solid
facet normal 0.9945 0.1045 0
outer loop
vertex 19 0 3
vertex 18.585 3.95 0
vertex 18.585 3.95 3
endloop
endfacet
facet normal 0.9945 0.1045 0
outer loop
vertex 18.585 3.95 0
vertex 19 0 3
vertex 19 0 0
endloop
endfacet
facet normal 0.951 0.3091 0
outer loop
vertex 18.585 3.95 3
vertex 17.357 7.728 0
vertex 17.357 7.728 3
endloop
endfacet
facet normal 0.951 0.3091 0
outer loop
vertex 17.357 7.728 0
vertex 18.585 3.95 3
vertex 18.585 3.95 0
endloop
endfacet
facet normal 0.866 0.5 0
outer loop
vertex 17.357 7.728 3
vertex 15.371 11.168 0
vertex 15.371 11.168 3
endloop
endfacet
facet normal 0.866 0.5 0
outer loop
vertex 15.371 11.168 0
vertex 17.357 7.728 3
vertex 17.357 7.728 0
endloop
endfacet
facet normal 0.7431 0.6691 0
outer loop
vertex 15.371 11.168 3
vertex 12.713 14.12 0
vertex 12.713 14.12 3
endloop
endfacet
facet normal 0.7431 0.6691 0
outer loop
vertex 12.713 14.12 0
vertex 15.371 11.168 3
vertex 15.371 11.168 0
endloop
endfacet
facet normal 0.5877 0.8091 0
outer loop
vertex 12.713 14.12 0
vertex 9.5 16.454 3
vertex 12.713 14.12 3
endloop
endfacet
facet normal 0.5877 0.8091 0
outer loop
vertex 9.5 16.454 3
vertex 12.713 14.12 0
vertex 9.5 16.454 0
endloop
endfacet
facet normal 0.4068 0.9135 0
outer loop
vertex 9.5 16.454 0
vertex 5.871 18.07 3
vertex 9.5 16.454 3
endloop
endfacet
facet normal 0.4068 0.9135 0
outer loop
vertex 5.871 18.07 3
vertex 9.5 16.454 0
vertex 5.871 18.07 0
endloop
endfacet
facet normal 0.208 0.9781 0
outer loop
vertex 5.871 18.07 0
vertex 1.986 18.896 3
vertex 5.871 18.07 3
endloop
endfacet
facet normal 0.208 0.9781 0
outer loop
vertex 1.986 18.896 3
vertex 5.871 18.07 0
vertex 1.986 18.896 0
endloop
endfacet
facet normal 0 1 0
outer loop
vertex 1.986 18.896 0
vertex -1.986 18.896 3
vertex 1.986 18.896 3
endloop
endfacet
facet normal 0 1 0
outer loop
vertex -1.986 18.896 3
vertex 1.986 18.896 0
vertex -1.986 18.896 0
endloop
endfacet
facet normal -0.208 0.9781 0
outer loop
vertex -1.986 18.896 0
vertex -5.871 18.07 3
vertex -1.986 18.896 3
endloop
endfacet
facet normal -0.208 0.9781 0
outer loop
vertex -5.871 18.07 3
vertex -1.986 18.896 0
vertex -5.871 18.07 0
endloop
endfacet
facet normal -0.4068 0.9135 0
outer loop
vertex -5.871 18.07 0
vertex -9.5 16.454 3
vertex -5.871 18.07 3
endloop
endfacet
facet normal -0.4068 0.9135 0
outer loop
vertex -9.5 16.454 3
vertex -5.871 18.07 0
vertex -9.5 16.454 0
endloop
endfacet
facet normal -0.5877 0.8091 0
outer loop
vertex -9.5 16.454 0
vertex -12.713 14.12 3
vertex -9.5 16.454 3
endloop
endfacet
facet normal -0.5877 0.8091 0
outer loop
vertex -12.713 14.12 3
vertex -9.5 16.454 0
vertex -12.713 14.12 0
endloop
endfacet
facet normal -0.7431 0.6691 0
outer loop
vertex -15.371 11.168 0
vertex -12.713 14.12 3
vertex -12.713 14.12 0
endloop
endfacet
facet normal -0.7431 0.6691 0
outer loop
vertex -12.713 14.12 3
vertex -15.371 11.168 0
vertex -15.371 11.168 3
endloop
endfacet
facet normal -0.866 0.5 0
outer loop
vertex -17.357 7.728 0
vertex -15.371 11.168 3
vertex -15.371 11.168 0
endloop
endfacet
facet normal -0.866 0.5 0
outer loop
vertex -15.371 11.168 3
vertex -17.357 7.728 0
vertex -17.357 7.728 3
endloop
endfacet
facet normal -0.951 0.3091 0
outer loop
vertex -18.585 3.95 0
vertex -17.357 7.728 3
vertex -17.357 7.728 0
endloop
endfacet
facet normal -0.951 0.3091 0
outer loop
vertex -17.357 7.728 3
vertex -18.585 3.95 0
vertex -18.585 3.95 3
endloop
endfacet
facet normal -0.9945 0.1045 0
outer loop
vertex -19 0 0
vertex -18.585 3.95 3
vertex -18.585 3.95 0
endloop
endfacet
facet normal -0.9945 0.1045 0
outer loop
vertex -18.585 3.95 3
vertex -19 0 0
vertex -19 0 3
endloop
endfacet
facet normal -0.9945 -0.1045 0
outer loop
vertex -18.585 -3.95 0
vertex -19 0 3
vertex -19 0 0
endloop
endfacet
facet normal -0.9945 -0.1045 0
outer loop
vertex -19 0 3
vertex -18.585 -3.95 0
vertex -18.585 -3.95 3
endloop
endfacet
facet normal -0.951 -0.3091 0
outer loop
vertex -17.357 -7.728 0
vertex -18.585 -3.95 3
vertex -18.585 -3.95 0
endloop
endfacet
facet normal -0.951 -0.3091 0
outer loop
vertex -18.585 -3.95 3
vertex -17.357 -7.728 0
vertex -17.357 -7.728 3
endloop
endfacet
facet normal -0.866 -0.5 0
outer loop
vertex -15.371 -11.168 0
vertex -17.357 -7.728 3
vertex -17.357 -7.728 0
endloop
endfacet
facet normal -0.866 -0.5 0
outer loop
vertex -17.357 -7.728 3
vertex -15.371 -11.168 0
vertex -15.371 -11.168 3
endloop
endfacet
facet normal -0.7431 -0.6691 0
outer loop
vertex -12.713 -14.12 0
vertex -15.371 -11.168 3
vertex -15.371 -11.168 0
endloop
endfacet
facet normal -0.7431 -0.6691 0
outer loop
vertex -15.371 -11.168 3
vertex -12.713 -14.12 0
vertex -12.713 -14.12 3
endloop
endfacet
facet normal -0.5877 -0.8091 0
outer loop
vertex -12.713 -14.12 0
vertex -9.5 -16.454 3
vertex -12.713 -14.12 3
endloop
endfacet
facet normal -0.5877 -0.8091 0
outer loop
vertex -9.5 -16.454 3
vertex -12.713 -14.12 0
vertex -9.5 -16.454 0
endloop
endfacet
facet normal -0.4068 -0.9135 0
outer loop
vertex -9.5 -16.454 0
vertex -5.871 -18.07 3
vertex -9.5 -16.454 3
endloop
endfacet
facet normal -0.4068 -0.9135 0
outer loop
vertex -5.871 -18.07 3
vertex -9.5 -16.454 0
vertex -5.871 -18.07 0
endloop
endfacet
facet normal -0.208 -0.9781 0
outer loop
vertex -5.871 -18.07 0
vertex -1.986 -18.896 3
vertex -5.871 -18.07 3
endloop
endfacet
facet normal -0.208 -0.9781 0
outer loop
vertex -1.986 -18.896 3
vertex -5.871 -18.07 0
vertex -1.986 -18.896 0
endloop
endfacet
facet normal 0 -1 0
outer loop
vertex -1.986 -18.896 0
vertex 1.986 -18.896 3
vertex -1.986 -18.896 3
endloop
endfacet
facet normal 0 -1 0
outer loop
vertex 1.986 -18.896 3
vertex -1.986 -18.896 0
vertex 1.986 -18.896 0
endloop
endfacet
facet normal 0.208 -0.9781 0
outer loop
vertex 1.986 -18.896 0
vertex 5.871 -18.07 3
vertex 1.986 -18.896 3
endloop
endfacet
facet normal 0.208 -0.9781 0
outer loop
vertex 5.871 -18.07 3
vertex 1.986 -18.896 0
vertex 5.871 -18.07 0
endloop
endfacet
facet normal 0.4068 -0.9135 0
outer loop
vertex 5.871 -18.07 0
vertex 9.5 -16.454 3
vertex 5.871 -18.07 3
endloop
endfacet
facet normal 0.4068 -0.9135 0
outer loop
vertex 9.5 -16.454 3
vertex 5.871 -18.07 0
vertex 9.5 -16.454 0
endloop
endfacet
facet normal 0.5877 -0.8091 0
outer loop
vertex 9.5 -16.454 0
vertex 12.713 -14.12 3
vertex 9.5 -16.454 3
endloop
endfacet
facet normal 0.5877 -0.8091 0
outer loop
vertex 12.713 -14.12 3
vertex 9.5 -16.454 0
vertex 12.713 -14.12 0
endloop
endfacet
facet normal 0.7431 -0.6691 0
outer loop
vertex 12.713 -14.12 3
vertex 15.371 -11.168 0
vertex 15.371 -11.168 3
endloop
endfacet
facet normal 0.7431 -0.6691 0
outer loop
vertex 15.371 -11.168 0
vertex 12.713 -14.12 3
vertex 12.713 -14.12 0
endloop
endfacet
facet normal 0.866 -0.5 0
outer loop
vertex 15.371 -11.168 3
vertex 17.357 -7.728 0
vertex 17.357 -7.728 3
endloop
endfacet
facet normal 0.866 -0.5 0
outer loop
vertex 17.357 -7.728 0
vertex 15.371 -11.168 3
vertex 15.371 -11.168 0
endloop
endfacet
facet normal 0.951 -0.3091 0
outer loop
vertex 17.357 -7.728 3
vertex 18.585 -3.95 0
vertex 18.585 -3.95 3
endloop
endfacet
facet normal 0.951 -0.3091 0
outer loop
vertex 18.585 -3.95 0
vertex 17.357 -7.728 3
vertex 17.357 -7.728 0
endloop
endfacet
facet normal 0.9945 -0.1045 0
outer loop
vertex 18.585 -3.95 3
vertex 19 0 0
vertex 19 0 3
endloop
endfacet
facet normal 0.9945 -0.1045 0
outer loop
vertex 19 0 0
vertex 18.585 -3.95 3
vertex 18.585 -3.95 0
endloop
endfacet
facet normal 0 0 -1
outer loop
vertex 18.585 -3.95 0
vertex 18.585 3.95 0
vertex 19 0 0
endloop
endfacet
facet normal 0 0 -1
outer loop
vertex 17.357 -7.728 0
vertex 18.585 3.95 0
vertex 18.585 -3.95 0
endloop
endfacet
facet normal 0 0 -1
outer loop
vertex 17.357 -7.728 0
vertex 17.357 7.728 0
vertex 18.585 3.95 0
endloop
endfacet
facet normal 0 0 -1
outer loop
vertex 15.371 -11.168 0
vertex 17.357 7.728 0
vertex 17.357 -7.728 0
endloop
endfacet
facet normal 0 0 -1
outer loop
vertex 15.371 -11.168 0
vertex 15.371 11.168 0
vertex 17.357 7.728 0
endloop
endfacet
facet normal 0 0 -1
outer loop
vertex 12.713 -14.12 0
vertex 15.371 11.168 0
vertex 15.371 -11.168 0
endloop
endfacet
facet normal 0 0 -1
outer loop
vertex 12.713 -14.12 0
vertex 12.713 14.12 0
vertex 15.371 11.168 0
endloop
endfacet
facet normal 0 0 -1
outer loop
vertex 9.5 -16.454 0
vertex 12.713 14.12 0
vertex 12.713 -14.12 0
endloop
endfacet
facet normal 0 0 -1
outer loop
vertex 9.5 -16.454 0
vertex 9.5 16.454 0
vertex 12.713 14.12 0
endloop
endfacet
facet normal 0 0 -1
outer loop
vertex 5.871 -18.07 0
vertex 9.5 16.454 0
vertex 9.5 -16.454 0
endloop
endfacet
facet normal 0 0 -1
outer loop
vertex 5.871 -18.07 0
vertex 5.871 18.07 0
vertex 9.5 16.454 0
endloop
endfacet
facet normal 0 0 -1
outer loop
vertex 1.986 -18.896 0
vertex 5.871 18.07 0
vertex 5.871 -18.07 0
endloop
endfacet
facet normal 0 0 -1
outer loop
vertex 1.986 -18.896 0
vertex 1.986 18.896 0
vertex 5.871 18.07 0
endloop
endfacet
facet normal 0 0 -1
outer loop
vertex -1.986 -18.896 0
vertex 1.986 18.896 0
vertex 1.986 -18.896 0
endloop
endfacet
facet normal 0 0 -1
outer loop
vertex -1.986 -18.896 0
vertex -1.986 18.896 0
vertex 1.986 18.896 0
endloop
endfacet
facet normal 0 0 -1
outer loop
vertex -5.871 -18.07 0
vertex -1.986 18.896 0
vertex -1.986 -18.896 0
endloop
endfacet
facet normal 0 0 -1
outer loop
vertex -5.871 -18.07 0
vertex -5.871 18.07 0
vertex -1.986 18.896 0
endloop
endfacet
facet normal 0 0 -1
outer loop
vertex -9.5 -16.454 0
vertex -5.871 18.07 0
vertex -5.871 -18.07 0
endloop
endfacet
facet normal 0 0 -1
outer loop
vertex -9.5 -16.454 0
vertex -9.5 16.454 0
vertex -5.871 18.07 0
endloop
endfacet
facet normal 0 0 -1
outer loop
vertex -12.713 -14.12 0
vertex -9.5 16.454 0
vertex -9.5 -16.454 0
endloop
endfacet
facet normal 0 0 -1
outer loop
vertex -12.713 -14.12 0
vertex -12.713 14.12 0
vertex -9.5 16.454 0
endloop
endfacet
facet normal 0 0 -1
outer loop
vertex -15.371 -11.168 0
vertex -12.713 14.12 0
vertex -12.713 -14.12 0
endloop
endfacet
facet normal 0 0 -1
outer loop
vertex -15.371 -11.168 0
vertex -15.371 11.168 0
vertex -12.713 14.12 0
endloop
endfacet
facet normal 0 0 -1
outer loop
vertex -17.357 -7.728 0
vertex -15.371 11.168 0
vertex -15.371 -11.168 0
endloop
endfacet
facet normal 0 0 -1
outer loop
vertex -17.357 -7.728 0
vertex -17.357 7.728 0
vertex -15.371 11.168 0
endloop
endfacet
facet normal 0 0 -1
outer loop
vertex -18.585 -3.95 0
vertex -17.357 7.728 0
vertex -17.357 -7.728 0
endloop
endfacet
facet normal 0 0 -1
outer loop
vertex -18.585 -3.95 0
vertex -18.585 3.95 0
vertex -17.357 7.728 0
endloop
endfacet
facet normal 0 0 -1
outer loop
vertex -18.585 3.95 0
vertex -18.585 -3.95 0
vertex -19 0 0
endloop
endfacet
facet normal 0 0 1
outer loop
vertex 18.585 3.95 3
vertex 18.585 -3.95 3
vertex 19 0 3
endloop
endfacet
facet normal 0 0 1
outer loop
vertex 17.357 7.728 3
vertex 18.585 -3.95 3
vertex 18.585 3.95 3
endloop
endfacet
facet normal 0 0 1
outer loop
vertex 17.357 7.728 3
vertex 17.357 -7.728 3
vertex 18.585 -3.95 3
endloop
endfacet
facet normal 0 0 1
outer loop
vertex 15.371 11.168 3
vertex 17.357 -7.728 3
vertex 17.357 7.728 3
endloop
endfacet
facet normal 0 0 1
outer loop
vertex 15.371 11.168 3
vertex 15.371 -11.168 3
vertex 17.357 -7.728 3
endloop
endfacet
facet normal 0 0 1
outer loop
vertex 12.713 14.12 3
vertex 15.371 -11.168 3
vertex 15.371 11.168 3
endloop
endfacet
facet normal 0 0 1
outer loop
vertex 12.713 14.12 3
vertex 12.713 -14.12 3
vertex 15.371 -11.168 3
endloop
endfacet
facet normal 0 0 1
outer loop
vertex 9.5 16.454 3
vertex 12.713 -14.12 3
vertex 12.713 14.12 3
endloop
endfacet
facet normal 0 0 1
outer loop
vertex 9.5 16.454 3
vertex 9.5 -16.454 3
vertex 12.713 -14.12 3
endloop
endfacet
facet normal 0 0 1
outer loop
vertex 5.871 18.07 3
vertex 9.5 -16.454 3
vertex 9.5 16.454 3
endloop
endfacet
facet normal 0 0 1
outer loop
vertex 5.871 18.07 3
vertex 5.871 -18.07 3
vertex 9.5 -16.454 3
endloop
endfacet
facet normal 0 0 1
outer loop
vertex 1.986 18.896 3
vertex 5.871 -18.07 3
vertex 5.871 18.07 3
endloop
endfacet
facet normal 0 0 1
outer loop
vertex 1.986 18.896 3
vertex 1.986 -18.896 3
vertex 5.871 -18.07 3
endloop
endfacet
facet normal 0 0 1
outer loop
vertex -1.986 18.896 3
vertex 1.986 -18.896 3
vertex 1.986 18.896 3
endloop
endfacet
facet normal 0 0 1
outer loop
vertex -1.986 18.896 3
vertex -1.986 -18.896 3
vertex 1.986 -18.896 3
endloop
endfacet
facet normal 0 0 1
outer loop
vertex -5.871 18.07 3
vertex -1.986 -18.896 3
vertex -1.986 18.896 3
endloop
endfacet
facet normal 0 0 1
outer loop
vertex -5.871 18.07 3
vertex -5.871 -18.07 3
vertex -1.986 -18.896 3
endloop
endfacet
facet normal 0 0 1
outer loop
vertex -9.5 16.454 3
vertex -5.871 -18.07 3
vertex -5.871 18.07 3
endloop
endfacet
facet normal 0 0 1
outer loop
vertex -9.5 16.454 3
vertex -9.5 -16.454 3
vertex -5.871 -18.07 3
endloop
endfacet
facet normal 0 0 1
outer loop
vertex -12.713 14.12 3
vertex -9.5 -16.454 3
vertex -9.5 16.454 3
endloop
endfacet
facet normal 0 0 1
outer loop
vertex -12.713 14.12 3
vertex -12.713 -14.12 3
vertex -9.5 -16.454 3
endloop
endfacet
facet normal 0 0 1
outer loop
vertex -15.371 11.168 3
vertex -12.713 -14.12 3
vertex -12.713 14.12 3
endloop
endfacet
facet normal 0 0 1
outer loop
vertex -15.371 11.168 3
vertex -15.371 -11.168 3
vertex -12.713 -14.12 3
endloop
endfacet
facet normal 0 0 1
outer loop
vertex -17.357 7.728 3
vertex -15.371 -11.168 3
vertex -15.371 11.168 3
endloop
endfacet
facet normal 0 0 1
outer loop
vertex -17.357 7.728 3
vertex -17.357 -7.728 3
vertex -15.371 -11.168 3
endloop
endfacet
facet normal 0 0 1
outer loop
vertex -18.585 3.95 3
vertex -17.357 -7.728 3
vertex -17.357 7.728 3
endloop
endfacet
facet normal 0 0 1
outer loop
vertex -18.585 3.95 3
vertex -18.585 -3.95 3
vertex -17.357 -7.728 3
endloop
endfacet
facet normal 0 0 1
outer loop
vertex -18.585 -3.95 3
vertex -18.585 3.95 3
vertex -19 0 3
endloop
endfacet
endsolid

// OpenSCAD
// Generated by SolidPython 1.0.1 on 2020-07-29 00:46:43


cylinder(h = 3, r1 = 19, r2 = 19);
/***********************************************
*********      SolidPython code:      **********
************************************************
 
# import packages: SolidPython
from solid import *
from solid.utils import *
from itertools import chain, combinations, permutations


class Resize:

    def __init__(self, scad_file):
        self.scad_file = scad_file
        #self.scad_file = import_scad(scad_file)
        # cone/cylinder param:
        self.r1 = 0
        self.r2 = 0
        self.h = 0
        # rectangular prism param:
        self.w = 0
        self.l = 0
        # ellipse param:
        self.r = 0

    # import OpenScad code (file name corresponds to shape)


    # classify shape + parameters
    def assign(self, param1, param2, param3):
        if self.scad_file == 'cone.scad':
            self.r1 = param1
            self.r2 = param2
            self.h = param3
        elif self.scad_file == 'cylinder.scad':
            self.r1 = param1
            self.r2 = param2
            self.h = param3
        elif self.scad_file == 'rectangularPrism.scad':
            self.h = param1
            self.l = param2
            self.w = param3
        else:
            self.r = param1
            self.h = param2

    # resize parameters
    def iterate(self):
        x = range(3, 20, 2)
        i = 1
        if self.scad_file == 'cone.scad':
            tempList = list(permutations(x, 2))
            for temp in tempList:
                param1 = temp[0]
                param2 = temp[1]
                filepath = 'produced_scad_files/' + 'cone' + str(param1) + '_' + str(param2) + '_' + '.scad'
                scad_render_to_file(cylinder(h=param1, r1=param2, r2=0), filepath)

        elif self.scad_file == 'cylinder.scad':
            tempList = list(permutations(x, 3))
            for temp in tempList:
                param1 = temp[0]
                param2 = temp[1]
                filepath = 'produced_scad_files/' + 'cylinder' + str(param1) + '_' + str(param2) + '_' + '.scad'
                scad_render_to_file(cylinder(h=param1, r1=param2, r2=param2), filepath)

        elif self.scad_file == 'rectangularPrism.scad':
            tempList = list(permutations(x, 3))
            for temp in tempList:
                param1 = temp[0]
                param2 = temp[1]
                param3 = temp[2]
                filepath = 'produced_scad_files/' + 'rectangularPrism' + str(param1) + '_' + str(param2) + '_' + str(
                    param3) + '.scad'
                scad_render_to_file(cube(size=(param1, param2, param3)), filepath)

        elif self.scad_file == 'ellipse.scad':
            tempList = list(permutations(x, 4))
            for temp in tempList:
                param1 = temp[0]
                param2 = temp[1]
                param3 = temp[2]
                param4 = temp[3]
                filepath = 'produced_scad_files/' + 'ellipse' + str(param1) + '_' + str(param2) + '_' + str(param3) + '_' + str(param4) + '.scad'
                scad_render_to_file(scale([param1, param2, param3])(sphere(r=param4)), filepath)

    def render_to_scadfile(self):
        scad_render_to_file(scad, 'example.scad') 
 
************************************************/
